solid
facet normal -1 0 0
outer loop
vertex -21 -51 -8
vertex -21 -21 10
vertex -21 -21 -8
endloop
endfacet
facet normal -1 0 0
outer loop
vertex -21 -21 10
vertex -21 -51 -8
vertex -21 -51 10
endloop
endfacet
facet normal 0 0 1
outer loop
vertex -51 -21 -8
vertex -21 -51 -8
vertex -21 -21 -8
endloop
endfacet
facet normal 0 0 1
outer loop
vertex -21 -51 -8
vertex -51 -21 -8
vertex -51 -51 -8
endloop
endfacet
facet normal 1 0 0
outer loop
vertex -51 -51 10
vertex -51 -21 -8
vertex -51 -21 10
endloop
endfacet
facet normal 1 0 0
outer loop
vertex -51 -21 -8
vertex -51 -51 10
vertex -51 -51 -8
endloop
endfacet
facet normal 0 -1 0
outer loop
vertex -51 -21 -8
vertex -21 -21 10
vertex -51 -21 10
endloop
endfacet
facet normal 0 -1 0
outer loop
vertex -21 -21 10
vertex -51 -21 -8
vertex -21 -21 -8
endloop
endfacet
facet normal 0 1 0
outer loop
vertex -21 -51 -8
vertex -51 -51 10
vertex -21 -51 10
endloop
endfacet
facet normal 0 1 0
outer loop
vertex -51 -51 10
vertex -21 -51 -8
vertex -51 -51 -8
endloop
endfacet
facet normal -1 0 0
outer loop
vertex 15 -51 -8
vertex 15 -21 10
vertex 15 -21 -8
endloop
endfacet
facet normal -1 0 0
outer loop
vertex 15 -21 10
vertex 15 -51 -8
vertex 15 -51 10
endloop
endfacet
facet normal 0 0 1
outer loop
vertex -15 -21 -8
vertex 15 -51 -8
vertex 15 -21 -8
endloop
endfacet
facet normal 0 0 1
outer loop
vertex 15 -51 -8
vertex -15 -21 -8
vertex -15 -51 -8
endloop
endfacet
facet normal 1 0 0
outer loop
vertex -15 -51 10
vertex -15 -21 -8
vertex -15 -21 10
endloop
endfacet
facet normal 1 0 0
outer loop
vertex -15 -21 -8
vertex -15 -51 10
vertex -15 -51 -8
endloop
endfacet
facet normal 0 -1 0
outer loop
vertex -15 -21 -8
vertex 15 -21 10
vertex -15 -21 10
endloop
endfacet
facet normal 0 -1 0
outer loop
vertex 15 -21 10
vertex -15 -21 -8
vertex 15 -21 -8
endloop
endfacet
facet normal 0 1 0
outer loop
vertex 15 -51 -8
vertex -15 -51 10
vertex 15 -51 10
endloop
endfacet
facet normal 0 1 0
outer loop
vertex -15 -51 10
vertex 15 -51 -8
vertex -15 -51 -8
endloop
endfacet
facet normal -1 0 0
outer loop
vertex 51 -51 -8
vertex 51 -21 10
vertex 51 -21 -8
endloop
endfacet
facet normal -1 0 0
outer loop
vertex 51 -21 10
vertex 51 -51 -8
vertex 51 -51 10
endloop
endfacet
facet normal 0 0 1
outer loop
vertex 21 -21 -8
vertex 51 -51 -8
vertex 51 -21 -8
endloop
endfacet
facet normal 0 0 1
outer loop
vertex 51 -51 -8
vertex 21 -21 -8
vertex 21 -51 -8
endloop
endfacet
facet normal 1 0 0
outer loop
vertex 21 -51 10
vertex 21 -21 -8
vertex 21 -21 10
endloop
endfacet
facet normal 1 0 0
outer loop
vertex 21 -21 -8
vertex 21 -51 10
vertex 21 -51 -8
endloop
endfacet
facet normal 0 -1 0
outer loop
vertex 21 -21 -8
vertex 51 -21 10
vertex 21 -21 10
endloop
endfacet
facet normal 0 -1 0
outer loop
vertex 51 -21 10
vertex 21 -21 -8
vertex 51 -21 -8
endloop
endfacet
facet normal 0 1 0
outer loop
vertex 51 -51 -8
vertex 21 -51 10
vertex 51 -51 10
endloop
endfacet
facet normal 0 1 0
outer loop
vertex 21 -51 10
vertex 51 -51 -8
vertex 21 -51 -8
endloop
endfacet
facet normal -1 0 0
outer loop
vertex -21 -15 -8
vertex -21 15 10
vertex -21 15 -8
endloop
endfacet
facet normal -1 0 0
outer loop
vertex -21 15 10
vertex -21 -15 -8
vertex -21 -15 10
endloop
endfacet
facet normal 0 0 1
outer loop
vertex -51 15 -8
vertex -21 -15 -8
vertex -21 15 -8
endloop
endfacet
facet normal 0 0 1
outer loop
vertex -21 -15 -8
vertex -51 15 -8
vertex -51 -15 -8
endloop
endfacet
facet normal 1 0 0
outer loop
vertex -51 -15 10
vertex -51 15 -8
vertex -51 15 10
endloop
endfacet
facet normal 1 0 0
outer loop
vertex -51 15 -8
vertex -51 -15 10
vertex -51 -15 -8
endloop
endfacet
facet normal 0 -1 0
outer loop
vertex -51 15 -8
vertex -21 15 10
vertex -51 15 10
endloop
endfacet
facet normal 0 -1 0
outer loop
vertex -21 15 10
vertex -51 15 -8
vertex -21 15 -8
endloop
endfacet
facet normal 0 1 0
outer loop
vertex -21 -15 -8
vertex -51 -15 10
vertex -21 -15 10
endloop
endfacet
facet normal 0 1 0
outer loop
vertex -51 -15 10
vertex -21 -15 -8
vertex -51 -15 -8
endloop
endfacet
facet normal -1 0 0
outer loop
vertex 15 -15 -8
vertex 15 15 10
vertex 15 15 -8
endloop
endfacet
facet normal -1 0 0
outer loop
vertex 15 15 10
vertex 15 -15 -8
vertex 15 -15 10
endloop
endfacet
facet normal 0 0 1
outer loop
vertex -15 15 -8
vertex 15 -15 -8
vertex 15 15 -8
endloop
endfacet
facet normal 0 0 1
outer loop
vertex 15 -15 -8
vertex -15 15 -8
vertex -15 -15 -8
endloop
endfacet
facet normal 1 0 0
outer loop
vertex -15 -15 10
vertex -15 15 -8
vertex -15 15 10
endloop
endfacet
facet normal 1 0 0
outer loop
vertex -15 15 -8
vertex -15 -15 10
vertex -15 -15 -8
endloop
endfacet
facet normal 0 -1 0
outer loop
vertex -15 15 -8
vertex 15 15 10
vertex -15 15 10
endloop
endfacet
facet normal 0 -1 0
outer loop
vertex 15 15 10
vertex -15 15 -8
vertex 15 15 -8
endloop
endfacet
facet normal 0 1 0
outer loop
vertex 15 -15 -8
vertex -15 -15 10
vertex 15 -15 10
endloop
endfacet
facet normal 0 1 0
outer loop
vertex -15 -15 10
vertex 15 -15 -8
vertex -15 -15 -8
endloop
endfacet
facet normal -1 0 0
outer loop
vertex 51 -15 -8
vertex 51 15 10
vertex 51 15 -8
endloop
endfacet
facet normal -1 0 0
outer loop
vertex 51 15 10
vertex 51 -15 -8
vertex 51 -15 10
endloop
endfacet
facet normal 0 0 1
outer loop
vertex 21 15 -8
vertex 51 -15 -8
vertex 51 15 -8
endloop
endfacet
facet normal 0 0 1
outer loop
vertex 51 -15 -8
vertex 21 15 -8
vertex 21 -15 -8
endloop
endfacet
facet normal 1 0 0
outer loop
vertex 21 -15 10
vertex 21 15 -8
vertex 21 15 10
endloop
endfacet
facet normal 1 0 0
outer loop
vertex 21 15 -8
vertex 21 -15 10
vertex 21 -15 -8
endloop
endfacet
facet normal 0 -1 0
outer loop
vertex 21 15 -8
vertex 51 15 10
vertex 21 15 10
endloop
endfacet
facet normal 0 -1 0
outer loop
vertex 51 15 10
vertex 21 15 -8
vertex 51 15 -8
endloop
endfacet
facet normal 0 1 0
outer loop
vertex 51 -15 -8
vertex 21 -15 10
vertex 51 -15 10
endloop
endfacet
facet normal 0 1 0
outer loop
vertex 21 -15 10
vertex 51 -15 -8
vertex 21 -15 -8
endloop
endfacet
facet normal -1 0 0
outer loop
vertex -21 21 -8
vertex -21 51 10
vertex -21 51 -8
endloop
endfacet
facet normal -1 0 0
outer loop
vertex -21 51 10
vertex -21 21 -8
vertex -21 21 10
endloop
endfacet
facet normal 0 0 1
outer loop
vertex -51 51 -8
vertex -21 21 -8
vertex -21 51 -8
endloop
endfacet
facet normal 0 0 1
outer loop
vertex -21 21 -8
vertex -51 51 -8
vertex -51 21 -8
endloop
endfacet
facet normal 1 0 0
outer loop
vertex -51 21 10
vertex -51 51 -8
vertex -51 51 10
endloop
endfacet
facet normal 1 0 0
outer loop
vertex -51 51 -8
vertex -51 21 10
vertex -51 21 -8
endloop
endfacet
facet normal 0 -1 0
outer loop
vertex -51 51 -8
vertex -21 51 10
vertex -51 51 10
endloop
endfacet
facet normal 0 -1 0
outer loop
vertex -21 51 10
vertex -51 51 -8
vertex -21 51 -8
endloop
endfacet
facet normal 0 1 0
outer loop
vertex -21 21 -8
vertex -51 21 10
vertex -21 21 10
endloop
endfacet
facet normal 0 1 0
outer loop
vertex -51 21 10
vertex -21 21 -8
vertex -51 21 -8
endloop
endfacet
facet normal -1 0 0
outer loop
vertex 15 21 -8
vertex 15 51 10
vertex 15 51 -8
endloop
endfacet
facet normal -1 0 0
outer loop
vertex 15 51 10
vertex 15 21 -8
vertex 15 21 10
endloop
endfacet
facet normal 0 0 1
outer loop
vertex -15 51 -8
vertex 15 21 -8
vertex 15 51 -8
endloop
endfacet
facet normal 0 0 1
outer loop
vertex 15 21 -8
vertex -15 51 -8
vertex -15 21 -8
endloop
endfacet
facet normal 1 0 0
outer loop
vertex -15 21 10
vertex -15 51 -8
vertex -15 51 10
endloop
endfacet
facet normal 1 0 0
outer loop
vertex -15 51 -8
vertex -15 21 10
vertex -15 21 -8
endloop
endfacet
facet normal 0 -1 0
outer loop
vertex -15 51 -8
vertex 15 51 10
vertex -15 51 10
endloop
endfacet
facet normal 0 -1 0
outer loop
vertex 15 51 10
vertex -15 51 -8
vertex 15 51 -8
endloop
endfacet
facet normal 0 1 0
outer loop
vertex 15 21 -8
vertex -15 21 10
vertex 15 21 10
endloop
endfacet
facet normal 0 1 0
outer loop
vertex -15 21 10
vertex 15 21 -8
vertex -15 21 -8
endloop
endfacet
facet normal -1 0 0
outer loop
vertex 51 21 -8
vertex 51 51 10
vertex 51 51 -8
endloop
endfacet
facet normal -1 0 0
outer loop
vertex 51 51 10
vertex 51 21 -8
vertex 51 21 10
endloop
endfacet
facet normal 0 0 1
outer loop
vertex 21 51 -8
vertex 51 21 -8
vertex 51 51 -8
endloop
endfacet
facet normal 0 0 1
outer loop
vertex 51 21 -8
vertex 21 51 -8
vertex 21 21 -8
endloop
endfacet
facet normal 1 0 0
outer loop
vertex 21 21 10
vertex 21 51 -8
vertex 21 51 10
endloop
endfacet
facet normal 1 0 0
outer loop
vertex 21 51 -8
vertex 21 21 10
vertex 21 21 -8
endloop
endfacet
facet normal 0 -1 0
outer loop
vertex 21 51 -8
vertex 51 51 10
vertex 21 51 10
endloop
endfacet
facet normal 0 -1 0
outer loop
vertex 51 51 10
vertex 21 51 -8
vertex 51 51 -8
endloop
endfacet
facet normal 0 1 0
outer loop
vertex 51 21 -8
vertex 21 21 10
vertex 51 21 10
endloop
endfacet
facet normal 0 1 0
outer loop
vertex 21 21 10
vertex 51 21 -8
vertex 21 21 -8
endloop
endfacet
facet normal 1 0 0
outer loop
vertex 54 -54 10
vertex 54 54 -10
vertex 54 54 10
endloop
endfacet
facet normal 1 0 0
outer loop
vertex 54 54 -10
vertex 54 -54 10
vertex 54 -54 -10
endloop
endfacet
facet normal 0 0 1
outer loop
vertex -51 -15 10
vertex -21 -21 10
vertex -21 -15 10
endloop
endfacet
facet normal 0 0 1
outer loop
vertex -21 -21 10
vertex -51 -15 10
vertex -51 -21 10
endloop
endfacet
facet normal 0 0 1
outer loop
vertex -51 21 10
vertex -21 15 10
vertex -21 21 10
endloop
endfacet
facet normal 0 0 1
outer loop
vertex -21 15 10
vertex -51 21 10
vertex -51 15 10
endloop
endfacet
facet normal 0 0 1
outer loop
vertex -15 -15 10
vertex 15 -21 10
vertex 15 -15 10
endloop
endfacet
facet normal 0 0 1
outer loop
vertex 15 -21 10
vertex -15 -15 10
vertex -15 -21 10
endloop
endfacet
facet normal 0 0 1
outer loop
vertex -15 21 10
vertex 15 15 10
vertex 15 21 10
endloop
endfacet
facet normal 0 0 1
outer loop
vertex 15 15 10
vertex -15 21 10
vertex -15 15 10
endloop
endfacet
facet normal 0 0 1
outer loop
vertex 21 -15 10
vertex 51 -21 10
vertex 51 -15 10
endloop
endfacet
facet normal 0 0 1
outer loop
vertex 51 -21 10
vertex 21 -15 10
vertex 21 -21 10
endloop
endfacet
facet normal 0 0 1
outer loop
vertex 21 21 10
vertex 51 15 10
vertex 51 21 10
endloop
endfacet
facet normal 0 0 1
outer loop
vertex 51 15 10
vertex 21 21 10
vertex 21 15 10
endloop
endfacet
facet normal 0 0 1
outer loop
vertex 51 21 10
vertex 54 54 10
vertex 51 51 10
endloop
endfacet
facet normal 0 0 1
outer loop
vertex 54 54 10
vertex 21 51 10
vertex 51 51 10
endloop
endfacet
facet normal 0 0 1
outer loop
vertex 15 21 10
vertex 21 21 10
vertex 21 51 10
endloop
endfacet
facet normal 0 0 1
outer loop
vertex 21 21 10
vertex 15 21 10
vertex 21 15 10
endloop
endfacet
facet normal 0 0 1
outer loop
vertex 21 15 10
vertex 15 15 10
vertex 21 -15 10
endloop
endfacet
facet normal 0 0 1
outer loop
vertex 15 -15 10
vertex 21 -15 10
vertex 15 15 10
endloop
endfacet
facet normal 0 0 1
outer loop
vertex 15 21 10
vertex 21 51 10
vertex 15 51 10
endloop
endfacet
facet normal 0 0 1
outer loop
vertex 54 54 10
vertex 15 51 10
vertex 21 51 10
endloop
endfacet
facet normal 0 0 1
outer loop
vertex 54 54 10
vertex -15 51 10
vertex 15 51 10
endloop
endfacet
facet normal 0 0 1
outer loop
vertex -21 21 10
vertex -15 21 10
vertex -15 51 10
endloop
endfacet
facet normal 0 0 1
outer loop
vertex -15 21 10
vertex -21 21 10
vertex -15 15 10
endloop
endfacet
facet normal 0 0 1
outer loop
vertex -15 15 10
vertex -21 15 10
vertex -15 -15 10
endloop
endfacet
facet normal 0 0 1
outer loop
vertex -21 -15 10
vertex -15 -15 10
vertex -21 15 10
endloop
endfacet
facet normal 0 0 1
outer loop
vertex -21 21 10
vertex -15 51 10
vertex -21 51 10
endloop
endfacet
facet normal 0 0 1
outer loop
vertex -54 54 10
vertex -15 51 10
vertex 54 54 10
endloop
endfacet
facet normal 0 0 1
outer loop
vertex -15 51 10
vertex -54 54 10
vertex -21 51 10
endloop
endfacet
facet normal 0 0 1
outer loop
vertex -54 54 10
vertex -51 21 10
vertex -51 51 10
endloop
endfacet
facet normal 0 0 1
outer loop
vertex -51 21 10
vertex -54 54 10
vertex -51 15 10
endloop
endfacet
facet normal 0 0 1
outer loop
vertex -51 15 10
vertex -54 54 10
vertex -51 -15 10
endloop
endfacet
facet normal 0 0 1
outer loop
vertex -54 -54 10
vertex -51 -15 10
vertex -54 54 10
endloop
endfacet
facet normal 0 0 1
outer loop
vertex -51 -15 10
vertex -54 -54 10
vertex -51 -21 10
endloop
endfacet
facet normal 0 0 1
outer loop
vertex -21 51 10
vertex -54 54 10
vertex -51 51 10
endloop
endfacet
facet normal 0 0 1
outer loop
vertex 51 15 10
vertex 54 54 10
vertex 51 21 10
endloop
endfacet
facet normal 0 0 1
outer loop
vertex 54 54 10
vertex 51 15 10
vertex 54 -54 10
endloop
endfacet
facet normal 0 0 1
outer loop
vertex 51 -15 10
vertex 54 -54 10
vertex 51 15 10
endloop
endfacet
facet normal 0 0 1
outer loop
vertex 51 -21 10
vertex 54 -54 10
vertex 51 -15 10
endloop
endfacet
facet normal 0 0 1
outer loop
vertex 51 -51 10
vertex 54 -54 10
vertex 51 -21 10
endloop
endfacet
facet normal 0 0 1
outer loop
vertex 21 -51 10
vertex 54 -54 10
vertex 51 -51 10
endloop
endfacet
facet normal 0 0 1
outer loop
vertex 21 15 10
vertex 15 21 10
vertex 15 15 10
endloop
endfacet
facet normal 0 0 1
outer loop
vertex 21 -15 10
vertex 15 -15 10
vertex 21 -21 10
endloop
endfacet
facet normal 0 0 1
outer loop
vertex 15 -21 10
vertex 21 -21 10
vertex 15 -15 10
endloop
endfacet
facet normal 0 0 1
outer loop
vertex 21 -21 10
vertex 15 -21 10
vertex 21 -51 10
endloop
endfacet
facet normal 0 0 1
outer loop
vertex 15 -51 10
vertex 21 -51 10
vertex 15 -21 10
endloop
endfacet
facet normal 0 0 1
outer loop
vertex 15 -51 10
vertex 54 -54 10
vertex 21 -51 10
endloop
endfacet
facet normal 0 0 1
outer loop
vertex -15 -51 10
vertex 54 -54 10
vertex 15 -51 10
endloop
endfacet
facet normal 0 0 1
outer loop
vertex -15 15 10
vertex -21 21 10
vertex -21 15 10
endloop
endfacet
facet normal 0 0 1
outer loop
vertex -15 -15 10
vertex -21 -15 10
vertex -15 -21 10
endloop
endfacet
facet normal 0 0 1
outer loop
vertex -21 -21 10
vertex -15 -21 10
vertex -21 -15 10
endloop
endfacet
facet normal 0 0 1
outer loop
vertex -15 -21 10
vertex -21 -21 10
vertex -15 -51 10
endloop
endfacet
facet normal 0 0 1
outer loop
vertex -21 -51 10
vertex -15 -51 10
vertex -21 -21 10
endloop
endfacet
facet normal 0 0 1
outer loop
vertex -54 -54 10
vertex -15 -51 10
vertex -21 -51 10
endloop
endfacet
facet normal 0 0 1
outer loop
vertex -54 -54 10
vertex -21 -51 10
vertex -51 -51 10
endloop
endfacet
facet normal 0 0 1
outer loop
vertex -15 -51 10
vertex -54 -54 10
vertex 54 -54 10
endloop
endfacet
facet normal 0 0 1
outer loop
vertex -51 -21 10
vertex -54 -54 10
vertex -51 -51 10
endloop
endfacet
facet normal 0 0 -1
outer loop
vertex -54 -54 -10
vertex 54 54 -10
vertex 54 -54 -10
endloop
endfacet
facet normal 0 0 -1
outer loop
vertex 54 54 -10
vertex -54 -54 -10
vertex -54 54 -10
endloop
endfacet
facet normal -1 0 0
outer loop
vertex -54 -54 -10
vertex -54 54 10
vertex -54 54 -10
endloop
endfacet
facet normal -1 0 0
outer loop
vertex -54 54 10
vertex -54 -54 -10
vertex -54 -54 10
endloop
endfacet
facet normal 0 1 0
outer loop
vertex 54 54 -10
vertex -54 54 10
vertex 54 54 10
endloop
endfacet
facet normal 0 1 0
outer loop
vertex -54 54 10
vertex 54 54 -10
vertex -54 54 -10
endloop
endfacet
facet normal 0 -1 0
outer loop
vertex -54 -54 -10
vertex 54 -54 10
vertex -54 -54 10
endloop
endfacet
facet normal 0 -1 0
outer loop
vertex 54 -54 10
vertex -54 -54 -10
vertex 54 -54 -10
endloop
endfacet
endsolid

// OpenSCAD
$fn = 32;

// ----------------------------------------------------------------------
// Pocket plate 108 x 108 x 20
// 3 x 3 pockets 30 mm square, 18 mm deep
// ----------------------------------------------------------------------

// --- parameters (mm) ---
thickness = 20;   // plate thickness
seat_tol = 0.05;  // tolerance at the seating features
free_tol = 0.3;   // general tolerance on the free sizes
floor_t = 2;      // material left under each pocket
pocket = 30;      // pocket side length
pitch_x = 36;     // pocket pitch along X
pitch_y = 36;     // pocket pitch along Y
cols = 3;         // pockets per row
rows = 3;         // rows of pockets

// --- derived feature positions (mm) ---
depth = thickness - floor_t;        // = 18   pocket depth, down to the floor
span_x = (cols - 1) * pitch_x;      // = 72   distance between outer pockets
span_y = (rows - 1) * pitch_y;      // = 72   distance between outer pocket rows
origin_x = -span_x / 2;             // = -36   X of the first pocket
origin_y = -span_y / 2;             // = -36   Y of the first pocket
plate = [span_x + pocket + 6, span_y + pocket + 6, thickness];  // = [108, 108, 20]   overall size: pockets plus 3 mm of wall on each side
feature_centers = [
  [origin_x + 0 * pitch_x, origin_y + 0 * pitch_y],
  [origin_x + 1 * pitch_x, origin_y + 0 * pitch_y],
  [origin_x + 2 * pitch_x, origin_y + 0 * pitch_y],
  [origin_x + 0 * pitch_x, origin_y + 1 * pitch_y],
  [origin_x + 1 * pitch_x, origin_y + 1 * pitch_y],
  [origin_x + 2 * pitch_x, origin_y + 1 * pitch_y],
  [origin_x + 0 * pitch_x, origin_y + 2 * pitch_y],
  [origin_x + 1 * pitch_x, origin_y + 2 * pitch_y],
  [origin_x + 2 * pitch_x, origin_y + 2 * pitch_y]
];   // pocket centres, used verbatim by the cutter loop

// plate outline, then one pocket per centre in feature_centers
difference() {
  cube(plate, center = true);
  for (centre = feature_centers)
    translate([centre[0] - pocket / 2, centre[1] - pocket / 2, plate[2] / 2 - depth])
      cube([pocket, pocket, depth + 1]);  // centred on the declared pocket centre
}
